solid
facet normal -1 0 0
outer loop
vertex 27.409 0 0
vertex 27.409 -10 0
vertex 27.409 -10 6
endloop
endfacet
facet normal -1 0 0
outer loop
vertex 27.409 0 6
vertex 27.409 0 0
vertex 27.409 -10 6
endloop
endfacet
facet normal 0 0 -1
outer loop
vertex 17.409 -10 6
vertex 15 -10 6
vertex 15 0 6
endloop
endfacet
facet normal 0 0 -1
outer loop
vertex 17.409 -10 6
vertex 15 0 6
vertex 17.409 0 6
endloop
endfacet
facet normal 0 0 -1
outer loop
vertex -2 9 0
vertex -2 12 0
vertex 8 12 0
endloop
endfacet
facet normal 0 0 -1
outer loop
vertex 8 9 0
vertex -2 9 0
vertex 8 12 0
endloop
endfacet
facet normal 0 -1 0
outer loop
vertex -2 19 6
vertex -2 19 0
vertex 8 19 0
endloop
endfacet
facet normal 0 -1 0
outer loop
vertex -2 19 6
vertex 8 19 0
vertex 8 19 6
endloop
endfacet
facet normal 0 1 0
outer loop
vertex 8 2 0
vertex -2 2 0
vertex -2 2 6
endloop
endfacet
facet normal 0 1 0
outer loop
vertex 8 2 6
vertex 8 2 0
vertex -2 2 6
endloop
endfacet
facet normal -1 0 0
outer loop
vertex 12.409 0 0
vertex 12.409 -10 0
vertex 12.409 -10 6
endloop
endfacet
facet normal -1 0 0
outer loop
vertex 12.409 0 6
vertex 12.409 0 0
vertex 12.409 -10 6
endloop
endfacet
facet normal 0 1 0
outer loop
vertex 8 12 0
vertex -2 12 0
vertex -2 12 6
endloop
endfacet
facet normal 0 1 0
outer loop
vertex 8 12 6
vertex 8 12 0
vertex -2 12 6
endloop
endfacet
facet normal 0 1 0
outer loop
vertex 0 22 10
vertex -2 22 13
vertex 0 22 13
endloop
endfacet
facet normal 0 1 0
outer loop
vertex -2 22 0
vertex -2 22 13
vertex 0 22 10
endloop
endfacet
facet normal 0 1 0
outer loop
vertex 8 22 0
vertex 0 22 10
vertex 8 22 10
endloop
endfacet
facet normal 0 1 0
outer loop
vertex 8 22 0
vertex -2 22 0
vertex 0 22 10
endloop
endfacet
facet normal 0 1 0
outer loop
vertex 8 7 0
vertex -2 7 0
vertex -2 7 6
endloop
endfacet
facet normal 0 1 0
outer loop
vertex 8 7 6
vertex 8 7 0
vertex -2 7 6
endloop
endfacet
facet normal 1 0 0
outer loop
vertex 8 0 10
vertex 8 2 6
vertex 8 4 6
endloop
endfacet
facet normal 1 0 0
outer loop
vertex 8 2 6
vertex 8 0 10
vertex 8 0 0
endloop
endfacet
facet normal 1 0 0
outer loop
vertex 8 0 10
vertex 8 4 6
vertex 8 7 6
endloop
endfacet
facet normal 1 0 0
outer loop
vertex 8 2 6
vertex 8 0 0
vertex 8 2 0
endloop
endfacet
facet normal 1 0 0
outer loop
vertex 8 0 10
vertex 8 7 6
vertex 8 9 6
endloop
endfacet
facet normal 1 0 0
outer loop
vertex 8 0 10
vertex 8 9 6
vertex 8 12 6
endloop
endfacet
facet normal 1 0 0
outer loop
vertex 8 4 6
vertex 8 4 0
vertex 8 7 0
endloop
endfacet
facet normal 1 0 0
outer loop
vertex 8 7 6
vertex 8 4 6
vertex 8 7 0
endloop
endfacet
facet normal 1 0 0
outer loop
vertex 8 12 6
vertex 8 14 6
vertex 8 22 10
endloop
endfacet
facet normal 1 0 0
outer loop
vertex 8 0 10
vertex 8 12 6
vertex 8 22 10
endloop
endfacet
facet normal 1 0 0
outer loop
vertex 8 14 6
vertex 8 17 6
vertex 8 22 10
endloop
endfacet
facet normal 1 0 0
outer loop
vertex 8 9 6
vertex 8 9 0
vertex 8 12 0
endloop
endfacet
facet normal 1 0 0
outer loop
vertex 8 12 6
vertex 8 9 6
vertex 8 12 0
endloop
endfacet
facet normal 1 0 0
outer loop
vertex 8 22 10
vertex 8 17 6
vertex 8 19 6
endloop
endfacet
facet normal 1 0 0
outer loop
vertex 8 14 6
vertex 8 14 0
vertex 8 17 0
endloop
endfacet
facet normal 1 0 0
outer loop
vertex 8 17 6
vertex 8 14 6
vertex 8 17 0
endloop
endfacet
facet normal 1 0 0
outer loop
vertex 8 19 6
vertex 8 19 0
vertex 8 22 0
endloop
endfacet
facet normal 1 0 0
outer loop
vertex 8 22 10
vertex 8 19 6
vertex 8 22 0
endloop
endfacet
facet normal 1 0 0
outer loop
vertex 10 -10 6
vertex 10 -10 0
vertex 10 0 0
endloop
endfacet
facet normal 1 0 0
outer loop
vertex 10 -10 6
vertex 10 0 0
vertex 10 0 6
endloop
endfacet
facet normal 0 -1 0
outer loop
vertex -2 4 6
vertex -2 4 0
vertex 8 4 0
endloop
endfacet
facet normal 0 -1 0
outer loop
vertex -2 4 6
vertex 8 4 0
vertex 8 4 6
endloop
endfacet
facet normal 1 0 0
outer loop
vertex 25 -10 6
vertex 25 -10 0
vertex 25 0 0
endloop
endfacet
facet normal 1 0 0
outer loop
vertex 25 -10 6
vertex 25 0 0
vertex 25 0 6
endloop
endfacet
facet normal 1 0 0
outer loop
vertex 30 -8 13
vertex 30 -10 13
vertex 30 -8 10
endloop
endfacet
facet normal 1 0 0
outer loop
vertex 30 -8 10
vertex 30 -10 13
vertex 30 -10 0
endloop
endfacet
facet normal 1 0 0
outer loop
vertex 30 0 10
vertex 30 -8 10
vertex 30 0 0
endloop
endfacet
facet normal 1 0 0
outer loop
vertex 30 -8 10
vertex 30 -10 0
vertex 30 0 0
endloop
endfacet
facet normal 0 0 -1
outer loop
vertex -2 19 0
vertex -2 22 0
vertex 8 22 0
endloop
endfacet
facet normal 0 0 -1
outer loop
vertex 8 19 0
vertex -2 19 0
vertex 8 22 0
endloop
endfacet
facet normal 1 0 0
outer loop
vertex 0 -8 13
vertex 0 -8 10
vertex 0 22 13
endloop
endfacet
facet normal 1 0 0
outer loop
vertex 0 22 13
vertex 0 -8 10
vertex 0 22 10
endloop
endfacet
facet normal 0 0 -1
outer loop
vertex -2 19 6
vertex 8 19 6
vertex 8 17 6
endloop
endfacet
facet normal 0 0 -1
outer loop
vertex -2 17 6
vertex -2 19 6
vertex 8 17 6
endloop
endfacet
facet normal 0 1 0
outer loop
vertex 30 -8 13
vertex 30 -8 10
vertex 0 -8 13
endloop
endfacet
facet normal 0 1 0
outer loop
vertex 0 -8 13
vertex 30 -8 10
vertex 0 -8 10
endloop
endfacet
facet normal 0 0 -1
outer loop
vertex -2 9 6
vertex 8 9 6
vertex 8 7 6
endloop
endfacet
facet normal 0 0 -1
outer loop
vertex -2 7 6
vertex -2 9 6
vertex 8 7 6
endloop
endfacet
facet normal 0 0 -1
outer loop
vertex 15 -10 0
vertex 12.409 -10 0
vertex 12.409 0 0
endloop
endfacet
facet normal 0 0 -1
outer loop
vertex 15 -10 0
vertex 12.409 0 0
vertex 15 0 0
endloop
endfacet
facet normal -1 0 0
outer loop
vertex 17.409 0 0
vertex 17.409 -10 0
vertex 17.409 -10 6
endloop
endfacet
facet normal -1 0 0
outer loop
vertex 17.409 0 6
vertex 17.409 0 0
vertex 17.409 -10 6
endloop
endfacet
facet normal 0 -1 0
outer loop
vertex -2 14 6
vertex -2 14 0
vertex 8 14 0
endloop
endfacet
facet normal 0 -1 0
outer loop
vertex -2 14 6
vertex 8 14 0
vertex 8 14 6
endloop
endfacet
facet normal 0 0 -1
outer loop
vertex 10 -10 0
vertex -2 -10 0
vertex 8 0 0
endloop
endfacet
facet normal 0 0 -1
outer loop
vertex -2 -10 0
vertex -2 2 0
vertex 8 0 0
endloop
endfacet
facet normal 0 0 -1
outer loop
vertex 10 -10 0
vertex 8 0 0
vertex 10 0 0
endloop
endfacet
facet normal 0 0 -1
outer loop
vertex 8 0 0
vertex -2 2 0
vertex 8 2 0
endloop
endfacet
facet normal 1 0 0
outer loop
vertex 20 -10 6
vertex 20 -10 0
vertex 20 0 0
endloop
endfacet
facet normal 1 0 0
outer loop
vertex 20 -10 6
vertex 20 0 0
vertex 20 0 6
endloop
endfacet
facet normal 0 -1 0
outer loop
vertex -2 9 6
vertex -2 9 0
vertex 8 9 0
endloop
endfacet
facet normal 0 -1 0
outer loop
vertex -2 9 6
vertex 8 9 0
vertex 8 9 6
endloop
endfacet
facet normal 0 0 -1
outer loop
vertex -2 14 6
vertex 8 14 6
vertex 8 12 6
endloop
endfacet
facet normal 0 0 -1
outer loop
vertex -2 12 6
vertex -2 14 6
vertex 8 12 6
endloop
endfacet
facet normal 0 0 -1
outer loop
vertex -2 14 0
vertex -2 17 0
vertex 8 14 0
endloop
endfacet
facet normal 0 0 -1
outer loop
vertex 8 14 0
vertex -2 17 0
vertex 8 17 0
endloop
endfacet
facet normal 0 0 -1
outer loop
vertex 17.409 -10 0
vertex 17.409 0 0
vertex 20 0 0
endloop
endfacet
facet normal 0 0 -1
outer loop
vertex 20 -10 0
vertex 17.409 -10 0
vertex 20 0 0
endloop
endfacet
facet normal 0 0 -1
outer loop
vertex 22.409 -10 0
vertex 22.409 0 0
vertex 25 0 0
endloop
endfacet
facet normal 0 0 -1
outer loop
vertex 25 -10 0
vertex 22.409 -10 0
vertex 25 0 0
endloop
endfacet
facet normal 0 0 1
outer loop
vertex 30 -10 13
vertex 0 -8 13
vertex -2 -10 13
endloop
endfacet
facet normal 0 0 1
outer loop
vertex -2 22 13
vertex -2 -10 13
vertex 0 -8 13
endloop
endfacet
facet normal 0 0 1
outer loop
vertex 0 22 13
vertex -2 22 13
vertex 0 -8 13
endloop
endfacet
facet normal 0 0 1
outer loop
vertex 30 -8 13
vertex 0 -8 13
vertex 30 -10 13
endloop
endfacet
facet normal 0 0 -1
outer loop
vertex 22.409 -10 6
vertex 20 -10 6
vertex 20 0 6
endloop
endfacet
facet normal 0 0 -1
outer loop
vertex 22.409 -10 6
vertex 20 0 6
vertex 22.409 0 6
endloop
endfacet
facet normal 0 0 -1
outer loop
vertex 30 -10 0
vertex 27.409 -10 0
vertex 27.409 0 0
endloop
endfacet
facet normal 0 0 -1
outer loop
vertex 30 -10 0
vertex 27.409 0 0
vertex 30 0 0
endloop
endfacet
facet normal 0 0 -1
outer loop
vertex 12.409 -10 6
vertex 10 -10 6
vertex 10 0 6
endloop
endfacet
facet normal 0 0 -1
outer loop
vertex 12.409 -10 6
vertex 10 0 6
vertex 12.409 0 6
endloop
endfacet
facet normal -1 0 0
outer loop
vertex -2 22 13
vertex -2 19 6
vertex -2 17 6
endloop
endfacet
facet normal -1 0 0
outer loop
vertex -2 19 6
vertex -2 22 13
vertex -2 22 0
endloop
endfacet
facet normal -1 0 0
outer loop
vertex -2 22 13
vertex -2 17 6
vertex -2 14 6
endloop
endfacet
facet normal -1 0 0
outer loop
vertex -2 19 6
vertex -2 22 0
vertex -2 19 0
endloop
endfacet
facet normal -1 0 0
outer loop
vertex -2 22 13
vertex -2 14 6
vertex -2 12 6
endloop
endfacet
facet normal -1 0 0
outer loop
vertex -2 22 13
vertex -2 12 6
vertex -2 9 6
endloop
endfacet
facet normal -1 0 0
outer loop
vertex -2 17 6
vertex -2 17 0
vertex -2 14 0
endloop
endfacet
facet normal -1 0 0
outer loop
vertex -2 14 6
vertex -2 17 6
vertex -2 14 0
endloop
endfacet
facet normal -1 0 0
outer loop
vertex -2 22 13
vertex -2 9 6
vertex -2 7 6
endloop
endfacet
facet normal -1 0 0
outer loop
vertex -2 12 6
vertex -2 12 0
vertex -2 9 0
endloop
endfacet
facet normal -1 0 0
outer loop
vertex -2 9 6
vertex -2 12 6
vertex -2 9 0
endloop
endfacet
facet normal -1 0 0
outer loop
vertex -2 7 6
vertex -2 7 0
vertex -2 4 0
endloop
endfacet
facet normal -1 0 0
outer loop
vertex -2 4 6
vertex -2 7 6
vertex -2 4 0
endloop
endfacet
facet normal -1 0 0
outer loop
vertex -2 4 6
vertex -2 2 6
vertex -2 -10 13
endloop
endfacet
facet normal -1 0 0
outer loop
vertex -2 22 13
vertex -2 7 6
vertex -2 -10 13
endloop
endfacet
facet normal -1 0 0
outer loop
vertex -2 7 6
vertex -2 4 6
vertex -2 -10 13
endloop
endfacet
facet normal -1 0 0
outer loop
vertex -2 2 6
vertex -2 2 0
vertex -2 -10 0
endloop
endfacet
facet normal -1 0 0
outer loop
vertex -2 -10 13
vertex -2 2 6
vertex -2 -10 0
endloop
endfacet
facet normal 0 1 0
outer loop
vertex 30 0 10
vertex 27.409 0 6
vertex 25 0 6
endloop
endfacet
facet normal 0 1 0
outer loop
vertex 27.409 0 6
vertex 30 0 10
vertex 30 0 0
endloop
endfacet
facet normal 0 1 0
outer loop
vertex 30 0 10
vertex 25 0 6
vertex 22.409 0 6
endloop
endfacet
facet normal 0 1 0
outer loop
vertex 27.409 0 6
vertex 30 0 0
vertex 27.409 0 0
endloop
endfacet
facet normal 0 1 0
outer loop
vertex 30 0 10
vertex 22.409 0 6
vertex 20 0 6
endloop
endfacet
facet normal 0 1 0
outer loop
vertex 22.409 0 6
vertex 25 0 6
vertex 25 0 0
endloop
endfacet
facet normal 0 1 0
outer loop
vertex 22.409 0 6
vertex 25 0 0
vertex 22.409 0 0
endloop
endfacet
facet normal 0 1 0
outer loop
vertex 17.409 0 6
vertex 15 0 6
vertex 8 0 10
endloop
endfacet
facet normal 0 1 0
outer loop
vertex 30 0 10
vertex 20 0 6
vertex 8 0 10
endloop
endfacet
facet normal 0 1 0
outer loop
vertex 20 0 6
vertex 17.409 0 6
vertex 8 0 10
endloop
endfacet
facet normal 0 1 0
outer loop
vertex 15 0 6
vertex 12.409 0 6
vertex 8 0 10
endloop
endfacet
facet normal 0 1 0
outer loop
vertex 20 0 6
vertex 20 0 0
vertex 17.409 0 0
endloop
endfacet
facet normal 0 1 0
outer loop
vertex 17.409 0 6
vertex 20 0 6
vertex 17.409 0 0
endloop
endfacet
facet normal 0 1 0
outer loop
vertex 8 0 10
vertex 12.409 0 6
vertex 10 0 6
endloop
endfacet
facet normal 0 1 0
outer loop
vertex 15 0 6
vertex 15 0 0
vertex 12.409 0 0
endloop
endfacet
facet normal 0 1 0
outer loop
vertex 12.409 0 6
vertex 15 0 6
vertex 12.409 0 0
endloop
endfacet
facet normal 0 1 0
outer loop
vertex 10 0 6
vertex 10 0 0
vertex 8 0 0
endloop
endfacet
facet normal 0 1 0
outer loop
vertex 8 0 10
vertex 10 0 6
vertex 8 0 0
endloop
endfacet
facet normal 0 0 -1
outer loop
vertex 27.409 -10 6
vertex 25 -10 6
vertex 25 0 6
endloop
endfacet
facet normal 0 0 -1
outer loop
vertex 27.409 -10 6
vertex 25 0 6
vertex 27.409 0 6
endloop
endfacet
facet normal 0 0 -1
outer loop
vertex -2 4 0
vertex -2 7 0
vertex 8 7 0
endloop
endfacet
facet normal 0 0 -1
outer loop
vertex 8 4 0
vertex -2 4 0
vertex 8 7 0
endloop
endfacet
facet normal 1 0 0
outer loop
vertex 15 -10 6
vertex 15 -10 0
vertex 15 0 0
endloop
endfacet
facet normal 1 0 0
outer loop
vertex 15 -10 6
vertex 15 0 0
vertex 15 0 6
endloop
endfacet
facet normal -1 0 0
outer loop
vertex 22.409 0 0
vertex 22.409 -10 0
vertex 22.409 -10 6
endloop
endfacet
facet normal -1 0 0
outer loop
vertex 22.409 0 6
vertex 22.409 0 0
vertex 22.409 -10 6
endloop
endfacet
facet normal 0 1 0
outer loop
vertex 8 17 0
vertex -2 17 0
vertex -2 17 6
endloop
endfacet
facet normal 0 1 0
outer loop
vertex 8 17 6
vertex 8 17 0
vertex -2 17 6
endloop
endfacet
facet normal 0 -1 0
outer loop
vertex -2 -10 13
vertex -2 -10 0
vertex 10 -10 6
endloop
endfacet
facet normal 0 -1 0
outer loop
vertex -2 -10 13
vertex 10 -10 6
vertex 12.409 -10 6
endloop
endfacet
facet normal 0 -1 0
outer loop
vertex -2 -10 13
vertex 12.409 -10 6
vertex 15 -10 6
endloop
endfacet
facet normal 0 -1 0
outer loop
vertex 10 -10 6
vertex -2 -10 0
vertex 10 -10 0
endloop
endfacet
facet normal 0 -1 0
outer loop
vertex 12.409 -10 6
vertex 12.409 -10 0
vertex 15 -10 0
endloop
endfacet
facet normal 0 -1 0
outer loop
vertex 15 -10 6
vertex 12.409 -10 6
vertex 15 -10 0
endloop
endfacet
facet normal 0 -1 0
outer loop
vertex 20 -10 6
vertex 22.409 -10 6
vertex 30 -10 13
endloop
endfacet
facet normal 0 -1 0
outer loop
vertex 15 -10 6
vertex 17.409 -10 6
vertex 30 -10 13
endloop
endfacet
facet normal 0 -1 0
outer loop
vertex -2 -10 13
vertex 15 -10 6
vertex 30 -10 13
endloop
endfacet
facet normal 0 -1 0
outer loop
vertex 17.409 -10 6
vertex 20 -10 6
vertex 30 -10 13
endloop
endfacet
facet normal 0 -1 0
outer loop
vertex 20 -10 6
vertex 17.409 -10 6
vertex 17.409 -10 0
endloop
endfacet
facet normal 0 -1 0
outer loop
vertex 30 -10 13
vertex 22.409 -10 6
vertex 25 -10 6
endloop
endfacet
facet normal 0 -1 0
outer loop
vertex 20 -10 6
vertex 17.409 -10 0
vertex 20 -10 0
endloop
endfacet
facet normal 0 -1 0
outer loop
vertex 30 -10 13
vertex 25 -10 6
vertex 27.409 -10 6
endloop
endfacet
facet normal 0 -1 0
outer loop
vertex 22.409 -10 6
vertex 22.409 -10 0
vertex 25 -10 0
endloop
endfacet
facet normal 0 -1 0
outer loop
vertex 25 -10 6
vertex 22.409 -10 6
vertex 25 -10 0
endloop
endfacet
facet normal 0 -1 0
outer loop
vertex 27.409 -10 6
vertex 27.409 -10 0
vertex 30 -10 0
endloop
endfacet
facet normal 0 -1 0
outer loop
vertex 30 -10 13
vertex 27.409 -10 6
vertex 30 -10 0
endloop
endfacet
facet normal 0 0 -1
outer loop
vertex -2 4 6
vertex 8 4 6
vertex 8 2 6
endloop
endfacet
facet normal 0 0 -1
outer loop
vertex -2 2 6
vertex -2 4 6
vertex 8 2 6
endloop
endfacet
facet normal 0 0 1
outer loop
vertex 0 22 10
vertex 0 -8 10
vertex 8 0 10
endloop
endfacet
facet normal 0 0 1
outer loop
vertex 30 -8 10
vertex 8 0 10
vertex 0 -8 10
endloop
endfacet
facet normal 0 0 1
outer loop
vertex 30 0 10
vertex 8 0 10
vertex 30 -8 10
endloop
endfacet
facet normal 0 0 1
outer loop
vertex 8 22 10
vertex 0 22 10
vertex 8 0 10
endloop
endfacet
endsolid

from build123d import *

# Parameters (mm, degrees)
F1_DEPTH = 13
F0_W     = 8
F0_H     = 22
F2_DEPTH = 10
F3_W     = 2.409125
F3_H     = 6
F5_DEPTH = 25
F4_W     = 2
F4_H     = 6
F6_DEPTH = 25


with BuildPart() as f1:
    # F0 (on Top) → F1 (new body)
    with BuildSketch(Plane.XY):
        Polygon((0, -8), (0, 0), (0, 22), (-2, 22), (-2, 11.907217), (-2, -10), (30, -10), (30, -8), align=None)
    extrude(amount=F1_DEPTH)

    # F0 (on Top) → F2 (join)
    with BuildSketch(Plane.XY):
        with Locations((4, 11)):
            Rectangle(F0_W, F0_H)
        Polygon((8, 0), (0, 0), (0, -8), (30, -8), (30, 0), align=None)
    extrude(amount=F2_DEPTH)

    # F3 (on face) → F5 (cut)
    with BuildSketch(Plane.XZ.offset(10)):
        with Locations((11.204562, 3)):
            Rectangle(F3_W, F3_H)
        with Locations((16.204563, 3)):
            Rectangle(F3_W, F3_H)
        with Locations((21.204563, 3)):
            Rectangle(F3_W, F3_H)
        with Locations((26.204563, 3)):
            Rectangle(F3_W, F3_H)
    extrude(amount=-F5_DEPTH, mode=Mode.SUBTRACT)

    # F4 (on face) → F6 (cut)
    with BuildSketch(Plane(origin=(-2, 0, 0), x_dir=(0, -1, 0), z_dir=(-1, 0, 0))):
        with Locations((-13, 3)):
            Rectangle(F4_W, F4_H)
        with Locations((-18, 3)):
            Rectangle(F4_W, F4_H)
        with Locations((-8, 3)):
            Rectangle(F4_W, F4_H)
        with Locations((-3, 3)):
            Rectangle(F4_W, F4_H)
    extrude(amount=-F6_DEPTH, mode=Mode.SUBTRACT)


solid = f1.part
